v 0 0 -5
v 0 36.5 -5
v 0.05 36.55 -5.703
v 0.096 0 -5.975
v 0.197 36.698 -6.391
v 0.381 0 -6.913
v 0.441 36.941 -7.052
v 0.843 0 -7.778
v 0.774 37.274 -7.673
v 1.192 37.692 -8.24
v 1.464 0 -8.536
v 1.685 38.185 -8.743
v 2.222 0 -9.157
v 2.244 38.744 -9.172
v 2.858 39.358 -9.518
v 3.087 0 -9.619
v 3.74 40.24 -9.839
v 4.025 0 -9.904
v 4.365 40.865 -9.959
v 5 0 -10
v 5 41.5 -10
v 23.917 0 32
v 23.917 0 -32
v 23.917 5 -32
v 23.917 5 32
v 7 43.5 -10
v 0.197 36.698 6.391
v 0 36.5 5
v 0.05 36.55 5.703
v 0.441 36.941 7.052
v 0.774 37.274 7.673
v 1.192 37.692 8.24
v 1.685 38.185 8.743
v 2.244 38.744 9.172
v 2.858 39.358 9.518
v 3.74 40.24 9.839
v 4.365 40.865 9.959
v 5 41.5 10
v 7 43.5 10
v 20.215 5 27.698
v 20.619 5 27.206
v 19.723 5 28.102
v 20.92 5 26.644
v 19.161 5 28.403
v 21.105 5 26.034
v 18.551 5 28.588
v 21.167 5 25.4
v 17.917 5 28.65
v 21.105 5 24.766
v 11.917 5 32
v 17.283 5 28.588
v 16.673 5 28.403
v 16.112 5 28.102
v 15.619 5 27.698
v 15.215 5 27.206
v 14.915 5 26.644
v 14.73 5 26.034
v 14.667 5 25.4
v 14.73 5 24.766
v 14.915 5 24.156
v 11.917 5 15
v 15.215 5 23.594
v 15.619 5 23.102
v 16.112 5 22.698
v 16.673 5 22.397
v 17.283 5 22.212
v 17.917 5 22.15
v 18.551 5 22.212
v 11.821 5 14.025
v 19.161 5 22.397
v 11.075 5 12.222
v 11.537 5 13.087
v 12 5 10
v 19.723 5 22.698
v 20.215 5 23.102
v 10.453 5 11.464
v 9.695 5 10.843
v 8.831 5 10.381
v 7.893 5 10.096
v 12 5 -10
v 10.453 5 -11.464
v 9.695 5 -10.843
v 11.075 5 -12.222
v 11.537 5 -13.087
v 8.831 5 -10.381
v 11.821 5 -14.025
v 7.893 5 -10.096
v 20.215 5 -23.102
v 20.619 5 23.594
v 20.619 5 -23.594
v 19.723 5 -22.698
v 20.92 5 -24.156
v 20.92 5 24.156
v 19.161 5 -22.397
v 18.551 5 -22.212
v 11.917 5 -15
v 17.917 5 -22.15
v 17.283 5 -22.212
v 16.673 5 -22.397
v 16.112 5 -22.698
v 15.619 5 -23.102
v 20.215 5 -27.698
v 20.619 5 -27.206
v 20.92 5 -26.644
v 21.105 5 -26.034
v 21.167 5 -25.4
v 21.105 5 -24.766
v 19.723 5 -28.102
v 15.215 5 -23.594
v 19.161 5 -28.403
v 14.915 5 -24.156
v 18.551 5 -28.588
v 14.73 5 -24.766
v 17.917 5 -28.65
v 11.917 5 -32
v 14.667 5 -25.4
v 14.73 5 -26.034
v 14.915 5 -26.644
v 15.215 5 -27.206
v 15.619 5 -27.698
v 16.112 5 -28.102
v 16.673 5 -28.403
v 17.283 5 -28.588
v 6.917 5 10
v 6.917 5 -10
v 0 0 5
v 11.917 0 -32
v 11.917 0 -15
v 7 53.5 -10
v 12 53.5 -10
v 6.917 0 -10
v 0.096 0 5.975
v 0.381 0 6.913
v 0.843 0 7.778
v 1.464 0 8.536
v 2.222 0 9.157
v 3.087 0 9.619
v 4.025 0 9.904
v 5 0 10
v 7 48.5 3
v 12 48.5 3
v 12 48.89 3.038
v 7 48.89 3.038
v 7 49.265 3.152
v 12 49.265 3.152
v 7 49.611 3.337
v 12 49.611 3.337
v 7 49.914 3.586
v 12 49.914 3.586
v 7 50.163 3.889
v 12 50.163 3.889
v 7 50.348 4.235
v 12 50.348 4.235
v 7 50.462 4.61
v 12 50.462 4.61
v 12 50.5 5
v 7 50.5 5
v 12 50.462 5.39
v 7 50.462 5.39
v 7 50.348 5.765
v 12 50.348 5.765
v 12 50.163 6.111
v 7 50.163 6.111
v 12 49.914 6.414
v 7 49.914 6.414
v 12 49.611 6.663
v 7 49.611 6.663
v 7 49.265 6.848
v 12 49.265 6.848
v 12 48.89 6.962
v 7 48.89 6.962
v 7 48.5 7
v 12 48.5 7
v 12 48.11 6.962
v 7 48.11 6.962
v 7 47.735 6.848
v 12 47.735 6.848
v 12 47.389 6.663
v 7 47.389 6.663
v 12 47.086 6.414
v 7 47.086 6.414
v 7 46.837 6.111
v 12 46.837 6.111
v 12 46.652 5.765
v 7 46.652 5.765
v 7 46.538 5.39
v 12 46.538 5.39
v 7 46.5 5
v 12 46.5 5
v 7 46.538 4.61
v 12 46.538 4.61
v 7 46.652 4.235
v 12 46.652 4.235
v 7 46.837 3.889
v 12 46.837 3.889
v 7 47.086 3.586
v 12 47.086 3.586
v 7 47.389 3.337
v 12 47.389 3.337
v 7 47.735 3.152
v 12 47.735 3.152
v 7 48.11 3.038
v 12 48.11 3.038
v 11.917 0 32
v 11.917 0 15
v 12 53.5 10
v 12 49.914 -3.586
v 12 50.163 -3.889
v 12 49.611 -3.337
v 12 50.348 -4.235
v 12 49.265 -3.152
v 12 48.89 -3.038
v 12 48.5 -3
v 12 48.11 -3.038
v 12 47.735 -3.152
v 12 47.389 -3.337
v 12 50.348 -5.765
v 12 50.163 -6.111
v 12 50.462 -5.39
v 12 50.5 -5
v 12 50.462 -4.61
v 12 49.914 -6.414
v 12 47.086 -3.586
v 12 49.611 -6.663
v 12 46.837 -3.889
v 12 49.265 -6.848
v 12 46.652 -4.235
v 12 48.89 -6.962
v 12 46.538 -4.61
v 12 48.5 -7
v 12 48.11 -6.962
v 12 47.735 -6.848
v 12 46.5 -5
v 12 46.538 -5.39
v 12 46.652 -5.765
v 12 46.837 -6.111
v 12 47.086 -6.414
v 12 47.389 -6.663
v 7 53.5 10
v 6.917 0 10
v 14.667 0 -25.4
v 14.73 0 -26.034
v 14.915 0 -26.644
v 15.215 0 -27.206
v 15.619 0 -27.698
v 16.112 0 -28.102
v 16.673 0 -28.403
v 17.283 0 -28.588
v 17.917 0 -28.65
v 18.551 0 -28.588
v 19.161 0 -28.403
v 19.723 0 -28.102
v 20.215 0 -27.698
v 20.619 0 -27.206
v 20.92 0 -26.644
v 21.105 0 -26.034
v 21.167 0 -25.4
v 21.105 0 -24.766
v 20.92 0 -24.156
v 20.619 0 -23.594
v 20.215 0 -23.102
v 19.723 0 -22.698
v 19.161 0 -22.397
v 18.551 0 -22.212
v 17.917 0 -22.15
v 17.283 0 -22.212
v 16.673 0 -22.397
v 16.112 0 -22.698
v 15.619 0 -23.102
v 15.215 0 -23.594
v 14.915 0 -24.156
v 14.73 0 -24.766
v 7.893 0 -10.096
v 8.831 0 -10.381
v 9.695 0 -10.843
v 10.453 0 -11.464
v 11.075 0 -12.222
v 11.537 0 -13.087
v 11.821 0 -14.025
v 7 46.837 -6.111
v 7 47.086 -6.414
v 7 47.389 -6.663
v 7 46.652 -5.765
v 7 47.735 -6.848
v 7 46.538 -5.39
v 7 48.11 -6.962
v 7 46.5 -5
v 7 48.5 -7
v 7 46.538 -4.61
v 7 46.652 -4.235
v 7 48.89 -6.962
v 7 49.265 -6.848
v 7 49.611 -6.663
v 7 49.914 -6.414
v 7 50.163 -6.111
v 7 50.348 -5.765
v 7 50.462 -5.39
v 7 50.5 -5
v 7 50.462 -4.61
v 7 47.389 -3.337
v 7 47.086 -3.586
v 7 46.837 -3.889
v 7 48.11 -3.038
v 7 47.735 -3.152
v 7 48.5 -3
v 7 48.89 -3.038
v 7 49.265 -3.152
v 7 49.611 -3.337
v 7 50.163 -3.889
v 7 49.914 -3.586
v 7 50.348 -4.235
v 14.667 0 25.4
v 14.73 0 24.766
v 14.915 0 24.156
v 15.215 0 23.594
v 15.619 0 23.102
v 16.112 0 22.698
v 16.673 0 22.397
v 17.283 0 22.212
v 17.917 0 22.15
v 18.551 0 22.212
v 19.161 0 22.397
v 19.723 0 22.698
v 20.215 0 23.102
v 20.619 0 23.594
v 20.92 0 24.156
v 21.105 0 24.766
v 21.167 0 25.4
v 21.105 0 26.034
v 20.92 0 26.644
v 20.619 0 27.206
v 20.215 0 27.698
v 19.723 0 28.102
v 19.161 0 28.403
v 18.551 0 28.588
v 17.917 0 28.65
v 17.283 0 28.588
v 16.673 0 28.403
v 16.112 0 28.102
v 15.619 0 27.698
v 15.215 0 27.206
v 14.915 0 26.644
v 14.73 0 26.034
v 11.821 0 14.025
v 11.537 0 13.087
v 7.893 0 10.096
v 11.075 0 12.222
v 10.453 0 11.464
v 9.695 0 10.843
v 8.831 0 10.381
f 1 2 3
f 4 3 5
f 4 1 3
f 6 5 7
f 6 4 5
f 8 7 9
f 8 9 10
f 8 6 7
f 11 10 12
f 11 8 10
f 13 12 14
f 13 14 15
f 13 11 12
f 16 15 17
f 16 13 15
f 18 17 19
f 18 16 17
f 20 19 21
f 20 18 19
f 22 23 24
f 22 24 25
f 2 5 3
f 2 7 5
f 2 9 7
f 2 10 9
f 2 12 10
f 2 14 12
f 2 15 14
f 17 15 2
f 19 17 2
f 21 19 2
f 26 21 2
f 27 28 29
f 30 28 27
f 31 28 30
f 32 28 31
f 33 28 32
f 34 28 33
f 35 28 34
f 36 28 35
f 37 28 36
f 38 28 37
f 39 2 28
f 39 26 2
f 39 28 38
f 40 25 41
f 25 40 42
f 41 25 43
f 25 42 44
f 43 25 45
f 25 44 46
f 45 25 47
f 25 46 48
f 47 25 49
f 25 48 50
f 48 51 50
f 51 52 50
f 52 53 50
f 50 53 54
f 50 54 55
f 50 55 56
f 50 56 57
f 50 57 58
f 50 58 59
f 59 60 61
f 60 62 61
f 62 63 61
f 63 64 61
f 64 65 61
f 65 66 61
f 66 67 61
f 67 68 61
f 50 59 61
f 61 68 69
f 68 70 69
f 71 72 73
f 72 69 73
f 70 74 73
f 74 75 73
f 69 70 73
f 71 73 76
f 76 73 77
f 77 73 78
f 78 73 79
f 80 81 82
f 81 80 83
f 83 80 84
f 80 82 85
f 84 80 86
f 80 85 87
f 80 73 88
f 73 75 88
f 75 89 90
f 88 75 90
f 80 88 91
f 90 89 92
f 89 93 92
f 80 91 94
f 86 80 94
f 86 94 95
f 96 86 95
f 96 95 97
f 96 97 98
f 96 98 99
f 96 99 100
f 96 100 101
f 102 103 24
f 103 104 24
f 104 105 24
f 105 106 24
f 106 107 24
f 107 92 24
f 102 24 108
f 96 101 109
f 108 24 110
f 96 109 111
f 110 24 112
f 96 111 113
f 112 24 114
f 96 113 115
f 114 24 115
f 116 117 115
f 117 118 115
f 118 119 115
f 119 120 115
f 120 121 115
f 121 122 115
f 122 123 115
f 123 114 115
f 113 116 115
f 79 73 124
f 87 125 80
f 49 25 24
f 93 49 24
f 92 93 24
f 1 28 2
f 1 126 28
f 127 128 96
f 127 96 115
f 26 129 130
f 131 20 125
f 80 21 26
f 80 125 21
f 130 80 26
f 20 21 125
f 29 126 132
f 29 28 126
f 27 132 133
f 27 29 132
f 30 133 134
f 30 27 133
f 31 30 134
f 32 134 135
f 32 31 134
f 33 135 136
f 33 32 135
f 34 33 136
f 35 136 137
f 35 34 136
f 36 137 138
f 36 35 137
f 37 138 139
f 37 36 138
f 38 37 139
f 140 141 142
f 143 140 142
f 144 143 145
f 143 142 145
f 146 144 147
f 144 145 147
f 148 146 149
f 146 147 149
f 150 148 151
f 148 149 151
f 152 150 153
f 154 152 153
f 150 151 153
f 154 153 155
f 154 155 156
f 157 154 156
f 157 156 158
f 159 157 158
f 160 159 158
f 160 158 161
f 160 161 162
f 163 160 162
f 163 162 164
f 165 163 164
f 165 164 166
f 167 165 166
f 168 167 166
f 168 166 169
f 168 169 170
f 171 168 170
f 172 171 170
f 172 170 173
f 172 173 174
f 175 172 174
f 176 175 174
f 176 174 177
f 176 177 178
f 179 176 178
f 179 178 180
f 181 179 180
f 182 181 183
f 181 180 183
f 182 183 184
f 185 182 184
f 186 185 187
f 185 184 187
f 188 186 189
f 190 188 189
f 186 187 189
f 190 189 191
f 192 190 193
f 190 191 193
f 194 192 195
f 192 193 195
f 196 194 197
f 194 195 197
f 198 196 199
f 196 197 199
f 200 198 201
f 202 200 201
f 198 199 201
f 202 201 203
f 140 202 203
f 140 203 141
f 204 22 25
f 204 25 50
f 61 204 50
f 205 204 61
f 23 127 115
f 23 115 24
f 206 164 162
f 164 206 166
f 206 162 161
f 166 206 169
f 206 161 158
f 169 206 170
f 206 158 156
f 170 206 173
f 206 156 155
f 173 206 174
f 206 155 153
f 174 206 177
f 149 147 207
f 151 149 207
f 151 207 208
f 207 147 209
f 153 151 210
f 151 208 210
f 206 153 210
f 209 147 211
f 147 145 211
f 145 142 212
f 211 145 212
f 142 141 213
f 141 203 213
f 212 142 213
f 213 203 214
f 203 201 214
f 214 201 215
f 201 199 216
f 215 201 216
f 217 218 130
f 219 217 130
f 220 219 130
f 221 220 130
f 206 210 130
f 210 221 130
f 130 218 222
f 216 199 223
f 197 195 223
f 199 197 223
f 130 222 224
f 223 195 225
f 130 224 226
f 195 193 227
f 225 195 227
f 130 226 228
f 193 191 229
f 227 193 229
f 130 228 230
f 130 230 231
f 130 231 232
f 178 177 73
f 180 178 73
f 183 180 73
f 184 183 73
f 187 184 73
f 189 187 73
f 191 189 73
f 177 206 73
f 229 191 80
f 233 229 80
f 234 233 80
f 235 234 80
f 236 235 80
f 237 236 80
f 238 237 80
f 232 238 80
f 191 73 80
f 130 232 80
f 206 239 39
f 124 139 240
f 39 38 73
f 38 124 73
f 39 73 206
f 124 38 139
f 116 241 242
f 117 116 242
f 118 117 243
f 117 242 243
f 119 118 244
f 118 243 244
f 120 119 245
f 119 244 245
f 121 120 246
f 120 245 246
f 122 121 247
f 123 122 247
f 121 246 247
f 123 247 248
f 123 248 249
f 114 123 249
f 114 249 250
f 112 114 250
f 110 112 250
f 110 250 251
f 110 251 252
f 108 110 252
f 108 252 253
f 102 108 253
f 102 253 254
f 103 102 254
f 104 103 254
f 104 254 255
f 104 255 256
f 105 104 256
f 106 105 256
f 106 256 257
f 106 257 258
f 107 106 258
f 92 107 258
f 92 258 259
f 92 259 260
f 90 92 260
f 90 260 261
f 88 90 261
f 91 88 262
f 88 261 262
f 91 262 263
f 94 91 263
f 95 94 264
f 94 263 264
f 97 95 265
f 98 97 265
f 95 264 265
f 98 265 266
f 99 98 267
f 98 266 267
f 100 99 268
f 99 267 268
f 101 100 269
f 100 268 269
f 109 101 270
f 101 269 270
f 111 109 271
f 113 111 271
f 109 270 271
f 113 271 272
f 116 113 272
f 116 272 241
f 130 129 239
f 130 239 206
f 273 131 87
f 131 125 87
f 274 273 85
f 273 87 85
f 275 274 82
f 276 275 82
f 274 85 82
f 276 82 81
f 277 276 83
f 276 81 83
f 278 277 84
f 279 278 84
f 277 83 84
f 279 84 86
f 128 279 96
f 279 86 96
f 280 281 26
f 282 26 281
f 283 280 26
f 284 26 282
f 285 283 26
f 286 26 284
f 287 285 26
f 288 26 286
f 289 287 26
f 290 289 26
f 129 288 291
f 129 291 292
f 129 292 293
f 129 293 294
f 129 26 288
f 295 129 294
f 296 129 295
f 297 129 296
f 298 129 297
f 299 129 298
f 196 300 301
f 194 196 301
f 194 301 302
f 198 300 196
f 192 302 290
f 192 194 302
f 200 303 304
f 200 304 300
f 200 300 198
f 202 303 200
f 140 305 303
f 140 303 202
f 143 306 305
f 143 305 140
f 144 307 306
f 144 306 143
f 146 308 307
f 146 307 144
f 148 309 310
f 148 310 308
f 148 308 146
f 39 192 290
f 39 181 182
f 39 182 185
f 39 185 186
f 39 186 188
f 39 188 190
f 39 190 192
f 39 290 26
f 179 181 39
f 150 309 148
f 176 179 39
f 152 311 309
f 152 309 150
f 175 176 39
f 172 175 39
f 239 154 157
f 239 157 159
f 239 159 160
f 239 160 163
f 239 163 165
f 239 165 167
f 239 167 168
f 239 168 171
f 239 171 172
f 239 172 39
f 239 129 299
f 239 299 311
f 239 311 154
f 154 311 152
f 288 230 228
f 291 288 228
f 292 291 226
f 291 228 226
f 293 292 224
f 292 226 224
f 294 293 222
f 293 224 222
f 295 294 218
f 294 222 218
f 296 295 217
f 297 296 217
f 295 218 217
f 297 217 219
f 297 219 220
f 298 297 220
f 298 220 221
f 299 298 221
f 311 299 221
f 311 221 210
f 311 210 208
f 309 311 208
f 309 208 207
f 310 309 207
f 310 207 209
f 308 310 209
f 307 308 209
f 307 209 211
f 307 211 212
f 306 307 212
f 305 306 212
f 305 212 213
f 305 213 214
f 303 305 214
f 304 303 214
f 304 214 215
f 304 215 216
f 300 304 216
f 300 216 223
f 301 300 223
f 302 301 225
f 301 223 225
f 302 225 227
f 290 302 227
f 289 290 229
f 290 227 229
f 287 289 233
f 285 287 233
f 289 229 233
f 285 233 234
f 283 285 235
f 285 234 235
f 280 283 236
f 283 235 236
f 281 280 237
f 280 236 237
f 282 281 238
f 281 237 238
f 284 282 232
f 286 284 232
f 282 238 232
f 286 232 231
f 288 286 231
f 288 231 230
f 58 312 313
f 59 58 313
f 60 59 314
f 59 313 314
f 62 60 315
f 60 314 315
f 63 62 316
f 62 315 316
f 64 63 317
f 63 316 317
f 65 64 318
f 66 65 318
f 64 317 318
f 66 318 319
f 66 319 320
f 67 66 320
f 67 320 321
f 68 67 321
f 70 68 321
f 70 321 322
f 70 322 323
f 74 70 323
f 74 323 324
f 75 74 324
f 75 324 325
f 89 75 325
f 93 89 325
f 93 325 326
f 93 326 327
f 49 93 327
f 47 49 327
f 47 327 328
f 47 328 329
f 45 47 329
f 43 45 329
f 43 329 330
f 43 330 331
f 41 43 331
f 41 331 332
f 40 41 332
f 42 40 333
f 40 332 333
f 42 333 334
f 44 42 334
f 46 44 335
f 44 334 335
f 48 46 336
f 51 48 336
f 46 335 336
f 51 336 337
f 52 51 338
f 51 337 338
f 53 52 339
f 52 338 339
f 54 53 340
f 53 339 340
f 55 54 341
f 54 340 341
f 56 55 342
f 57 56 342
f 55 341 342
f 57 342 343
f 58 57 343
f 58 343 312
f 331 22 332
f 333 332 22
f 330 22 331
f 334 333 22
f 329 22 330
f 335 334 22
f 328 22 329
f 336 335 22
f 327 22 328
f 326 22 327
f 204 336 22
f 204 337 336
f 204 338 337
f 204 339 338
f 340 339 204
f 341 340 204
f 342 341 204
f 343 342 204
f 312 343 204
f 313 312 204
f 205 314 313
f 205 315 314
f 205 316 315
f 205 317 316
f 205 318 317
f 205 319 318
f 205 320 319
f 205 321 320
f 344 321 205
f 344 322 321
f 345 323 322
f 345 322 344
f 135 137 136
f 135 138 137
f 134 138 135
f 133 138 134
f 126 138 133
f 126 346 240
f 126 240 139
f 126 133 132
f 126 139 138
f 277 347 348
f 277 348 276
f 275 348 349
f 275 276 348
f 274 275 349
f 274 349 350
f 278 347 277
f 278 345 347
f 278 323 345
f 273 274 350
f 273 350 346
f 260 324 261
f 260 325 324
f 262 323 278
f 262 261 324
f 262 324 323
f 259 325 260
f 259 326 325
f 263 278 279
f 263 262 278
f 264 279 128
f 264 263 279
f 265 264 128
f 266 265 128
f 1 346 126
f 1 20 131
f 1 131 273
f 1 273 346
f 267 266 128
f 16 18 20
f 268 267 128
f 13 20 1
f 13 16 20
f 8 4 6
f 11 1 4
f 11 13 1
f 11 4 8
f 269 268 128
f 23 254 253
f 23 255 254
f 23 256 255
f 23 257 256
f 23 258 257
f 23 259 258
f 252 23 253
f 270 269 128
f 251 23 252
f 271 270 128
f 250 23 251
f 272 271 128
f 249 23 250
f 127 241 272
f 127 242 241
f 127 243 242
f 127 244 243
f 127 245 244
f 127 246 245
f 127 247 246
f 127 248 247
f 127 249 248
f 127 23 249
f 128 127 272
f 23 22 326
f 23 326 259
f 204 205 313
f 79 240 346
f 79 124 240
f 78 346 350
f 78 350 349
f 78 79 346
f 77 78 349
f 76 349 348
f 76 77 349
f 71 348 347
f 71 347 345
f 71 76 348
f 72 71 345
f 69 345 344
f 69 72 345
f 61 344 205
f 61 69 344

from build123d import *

# Parameters (mm, degrees)
BOSS_EXTRUDE1_DEPTH                = 5
F_1_4_0_25_CLEARANCE_DOWEL_HOLE2_D = 6.499999954
SKETCH4_W                          = 12
SKETCH4_H                          = 20
BOSS_EXTRUDE2_DEPTH                = 48.5
SKETCH5_W                          = 20
SKETCH5_H                          = 10
CUT_EXTRUDE1_DEPTH                 = 7
F_4_0MM_CLEARANCE_DOWEL_HOLE1_D    = 4
CHAMFER1_SIZE                      = 7
FILLET1_R                          = 5


with BuildPart() as part:
    # Sketch1 → Boss-Extrude1 (new body)
    with BuildSketch(Plane(origin=(0, 0, 0), x_dir=(1, 0, 0), z_dir=(0, 1, 0))):
        Polygon((0, -10), (0, 10), (11.917176452, 10), (11.917176452, 32), (23.917176452, 32), (23.917176452, -32), (11.917176452, -32), (11.917176452, -10), align=None)
    extrude(amount=BOSS_EXTRUDE1_DEPTH)

    # 1/4 (0.25) Clearance Dowel Hole2 (through all)
    with Locations(Plane(origin=(0, 5, 0), x_dir=(1, 0, 0), z_dir=(0, 1, 0))):
        with Locations((17.917176452, -25.4), (17.917176452, 25.4)):
            Hole(F_1_4_0_25_CLEARANCE_DOWEL_HOLE2_D / 2)

    # Sketch4 → Boss-Extrude2 (add)
    with BuildSketch(Plane(origin=(0, 5, 0), x_dir=(1, 0, 0), z_dir=(0, 1, 0))):
        with Locations((6, 0)):
            Rectangle(SKETCH4_W, SKETCH4_H)
    extrude(amount=BOSS_EXTRUDE2_DEPTH)

    # Sketch5 → Cut-Extrude1 (cut)
    with BuildSketch(Plane.ZY):
        with Locations((0, 48.5)):
            Rectangle(SKETCH5_W, SKETCH5_H)
    extrude(amount=-CUT_EXTRUDE1_DEPTH, mode=Mode.SUBTRACT)

    # Ø4.0mm Clearance Dowel Hole1 (through all)
    with Locations(Plane.ZY.offset(-7)):
        with Locations((-5, 48.5), (5, 48.5)):
            Hole(F_4_0MM_CLEARANCE_DOWEL_HOLE1_D / 2)

    # Chamfer1
    chamfer1_edges = [part.edges().sort_by_distance(p)[0] for p in [
        (0, 43.5, 0),
    ]]
    chamfer(chamfer1_edges, length=CHAMFER1_SIZE - 0.0001)  # a hair under: the kernel refuses the full size

    # Fillet1
    fillet1_edges = [part.edges().sort_by_distance(p)[0] for p in [
        (11.917176452, 2.5, 10),
        (11.917176452, 2.5, -10),
        (0, 18.25005, 10),
        (0, 18.25005, -10),
    ]]
    fillet(fillet1_edges, radius=FILLET1_R)


solid = part.part
